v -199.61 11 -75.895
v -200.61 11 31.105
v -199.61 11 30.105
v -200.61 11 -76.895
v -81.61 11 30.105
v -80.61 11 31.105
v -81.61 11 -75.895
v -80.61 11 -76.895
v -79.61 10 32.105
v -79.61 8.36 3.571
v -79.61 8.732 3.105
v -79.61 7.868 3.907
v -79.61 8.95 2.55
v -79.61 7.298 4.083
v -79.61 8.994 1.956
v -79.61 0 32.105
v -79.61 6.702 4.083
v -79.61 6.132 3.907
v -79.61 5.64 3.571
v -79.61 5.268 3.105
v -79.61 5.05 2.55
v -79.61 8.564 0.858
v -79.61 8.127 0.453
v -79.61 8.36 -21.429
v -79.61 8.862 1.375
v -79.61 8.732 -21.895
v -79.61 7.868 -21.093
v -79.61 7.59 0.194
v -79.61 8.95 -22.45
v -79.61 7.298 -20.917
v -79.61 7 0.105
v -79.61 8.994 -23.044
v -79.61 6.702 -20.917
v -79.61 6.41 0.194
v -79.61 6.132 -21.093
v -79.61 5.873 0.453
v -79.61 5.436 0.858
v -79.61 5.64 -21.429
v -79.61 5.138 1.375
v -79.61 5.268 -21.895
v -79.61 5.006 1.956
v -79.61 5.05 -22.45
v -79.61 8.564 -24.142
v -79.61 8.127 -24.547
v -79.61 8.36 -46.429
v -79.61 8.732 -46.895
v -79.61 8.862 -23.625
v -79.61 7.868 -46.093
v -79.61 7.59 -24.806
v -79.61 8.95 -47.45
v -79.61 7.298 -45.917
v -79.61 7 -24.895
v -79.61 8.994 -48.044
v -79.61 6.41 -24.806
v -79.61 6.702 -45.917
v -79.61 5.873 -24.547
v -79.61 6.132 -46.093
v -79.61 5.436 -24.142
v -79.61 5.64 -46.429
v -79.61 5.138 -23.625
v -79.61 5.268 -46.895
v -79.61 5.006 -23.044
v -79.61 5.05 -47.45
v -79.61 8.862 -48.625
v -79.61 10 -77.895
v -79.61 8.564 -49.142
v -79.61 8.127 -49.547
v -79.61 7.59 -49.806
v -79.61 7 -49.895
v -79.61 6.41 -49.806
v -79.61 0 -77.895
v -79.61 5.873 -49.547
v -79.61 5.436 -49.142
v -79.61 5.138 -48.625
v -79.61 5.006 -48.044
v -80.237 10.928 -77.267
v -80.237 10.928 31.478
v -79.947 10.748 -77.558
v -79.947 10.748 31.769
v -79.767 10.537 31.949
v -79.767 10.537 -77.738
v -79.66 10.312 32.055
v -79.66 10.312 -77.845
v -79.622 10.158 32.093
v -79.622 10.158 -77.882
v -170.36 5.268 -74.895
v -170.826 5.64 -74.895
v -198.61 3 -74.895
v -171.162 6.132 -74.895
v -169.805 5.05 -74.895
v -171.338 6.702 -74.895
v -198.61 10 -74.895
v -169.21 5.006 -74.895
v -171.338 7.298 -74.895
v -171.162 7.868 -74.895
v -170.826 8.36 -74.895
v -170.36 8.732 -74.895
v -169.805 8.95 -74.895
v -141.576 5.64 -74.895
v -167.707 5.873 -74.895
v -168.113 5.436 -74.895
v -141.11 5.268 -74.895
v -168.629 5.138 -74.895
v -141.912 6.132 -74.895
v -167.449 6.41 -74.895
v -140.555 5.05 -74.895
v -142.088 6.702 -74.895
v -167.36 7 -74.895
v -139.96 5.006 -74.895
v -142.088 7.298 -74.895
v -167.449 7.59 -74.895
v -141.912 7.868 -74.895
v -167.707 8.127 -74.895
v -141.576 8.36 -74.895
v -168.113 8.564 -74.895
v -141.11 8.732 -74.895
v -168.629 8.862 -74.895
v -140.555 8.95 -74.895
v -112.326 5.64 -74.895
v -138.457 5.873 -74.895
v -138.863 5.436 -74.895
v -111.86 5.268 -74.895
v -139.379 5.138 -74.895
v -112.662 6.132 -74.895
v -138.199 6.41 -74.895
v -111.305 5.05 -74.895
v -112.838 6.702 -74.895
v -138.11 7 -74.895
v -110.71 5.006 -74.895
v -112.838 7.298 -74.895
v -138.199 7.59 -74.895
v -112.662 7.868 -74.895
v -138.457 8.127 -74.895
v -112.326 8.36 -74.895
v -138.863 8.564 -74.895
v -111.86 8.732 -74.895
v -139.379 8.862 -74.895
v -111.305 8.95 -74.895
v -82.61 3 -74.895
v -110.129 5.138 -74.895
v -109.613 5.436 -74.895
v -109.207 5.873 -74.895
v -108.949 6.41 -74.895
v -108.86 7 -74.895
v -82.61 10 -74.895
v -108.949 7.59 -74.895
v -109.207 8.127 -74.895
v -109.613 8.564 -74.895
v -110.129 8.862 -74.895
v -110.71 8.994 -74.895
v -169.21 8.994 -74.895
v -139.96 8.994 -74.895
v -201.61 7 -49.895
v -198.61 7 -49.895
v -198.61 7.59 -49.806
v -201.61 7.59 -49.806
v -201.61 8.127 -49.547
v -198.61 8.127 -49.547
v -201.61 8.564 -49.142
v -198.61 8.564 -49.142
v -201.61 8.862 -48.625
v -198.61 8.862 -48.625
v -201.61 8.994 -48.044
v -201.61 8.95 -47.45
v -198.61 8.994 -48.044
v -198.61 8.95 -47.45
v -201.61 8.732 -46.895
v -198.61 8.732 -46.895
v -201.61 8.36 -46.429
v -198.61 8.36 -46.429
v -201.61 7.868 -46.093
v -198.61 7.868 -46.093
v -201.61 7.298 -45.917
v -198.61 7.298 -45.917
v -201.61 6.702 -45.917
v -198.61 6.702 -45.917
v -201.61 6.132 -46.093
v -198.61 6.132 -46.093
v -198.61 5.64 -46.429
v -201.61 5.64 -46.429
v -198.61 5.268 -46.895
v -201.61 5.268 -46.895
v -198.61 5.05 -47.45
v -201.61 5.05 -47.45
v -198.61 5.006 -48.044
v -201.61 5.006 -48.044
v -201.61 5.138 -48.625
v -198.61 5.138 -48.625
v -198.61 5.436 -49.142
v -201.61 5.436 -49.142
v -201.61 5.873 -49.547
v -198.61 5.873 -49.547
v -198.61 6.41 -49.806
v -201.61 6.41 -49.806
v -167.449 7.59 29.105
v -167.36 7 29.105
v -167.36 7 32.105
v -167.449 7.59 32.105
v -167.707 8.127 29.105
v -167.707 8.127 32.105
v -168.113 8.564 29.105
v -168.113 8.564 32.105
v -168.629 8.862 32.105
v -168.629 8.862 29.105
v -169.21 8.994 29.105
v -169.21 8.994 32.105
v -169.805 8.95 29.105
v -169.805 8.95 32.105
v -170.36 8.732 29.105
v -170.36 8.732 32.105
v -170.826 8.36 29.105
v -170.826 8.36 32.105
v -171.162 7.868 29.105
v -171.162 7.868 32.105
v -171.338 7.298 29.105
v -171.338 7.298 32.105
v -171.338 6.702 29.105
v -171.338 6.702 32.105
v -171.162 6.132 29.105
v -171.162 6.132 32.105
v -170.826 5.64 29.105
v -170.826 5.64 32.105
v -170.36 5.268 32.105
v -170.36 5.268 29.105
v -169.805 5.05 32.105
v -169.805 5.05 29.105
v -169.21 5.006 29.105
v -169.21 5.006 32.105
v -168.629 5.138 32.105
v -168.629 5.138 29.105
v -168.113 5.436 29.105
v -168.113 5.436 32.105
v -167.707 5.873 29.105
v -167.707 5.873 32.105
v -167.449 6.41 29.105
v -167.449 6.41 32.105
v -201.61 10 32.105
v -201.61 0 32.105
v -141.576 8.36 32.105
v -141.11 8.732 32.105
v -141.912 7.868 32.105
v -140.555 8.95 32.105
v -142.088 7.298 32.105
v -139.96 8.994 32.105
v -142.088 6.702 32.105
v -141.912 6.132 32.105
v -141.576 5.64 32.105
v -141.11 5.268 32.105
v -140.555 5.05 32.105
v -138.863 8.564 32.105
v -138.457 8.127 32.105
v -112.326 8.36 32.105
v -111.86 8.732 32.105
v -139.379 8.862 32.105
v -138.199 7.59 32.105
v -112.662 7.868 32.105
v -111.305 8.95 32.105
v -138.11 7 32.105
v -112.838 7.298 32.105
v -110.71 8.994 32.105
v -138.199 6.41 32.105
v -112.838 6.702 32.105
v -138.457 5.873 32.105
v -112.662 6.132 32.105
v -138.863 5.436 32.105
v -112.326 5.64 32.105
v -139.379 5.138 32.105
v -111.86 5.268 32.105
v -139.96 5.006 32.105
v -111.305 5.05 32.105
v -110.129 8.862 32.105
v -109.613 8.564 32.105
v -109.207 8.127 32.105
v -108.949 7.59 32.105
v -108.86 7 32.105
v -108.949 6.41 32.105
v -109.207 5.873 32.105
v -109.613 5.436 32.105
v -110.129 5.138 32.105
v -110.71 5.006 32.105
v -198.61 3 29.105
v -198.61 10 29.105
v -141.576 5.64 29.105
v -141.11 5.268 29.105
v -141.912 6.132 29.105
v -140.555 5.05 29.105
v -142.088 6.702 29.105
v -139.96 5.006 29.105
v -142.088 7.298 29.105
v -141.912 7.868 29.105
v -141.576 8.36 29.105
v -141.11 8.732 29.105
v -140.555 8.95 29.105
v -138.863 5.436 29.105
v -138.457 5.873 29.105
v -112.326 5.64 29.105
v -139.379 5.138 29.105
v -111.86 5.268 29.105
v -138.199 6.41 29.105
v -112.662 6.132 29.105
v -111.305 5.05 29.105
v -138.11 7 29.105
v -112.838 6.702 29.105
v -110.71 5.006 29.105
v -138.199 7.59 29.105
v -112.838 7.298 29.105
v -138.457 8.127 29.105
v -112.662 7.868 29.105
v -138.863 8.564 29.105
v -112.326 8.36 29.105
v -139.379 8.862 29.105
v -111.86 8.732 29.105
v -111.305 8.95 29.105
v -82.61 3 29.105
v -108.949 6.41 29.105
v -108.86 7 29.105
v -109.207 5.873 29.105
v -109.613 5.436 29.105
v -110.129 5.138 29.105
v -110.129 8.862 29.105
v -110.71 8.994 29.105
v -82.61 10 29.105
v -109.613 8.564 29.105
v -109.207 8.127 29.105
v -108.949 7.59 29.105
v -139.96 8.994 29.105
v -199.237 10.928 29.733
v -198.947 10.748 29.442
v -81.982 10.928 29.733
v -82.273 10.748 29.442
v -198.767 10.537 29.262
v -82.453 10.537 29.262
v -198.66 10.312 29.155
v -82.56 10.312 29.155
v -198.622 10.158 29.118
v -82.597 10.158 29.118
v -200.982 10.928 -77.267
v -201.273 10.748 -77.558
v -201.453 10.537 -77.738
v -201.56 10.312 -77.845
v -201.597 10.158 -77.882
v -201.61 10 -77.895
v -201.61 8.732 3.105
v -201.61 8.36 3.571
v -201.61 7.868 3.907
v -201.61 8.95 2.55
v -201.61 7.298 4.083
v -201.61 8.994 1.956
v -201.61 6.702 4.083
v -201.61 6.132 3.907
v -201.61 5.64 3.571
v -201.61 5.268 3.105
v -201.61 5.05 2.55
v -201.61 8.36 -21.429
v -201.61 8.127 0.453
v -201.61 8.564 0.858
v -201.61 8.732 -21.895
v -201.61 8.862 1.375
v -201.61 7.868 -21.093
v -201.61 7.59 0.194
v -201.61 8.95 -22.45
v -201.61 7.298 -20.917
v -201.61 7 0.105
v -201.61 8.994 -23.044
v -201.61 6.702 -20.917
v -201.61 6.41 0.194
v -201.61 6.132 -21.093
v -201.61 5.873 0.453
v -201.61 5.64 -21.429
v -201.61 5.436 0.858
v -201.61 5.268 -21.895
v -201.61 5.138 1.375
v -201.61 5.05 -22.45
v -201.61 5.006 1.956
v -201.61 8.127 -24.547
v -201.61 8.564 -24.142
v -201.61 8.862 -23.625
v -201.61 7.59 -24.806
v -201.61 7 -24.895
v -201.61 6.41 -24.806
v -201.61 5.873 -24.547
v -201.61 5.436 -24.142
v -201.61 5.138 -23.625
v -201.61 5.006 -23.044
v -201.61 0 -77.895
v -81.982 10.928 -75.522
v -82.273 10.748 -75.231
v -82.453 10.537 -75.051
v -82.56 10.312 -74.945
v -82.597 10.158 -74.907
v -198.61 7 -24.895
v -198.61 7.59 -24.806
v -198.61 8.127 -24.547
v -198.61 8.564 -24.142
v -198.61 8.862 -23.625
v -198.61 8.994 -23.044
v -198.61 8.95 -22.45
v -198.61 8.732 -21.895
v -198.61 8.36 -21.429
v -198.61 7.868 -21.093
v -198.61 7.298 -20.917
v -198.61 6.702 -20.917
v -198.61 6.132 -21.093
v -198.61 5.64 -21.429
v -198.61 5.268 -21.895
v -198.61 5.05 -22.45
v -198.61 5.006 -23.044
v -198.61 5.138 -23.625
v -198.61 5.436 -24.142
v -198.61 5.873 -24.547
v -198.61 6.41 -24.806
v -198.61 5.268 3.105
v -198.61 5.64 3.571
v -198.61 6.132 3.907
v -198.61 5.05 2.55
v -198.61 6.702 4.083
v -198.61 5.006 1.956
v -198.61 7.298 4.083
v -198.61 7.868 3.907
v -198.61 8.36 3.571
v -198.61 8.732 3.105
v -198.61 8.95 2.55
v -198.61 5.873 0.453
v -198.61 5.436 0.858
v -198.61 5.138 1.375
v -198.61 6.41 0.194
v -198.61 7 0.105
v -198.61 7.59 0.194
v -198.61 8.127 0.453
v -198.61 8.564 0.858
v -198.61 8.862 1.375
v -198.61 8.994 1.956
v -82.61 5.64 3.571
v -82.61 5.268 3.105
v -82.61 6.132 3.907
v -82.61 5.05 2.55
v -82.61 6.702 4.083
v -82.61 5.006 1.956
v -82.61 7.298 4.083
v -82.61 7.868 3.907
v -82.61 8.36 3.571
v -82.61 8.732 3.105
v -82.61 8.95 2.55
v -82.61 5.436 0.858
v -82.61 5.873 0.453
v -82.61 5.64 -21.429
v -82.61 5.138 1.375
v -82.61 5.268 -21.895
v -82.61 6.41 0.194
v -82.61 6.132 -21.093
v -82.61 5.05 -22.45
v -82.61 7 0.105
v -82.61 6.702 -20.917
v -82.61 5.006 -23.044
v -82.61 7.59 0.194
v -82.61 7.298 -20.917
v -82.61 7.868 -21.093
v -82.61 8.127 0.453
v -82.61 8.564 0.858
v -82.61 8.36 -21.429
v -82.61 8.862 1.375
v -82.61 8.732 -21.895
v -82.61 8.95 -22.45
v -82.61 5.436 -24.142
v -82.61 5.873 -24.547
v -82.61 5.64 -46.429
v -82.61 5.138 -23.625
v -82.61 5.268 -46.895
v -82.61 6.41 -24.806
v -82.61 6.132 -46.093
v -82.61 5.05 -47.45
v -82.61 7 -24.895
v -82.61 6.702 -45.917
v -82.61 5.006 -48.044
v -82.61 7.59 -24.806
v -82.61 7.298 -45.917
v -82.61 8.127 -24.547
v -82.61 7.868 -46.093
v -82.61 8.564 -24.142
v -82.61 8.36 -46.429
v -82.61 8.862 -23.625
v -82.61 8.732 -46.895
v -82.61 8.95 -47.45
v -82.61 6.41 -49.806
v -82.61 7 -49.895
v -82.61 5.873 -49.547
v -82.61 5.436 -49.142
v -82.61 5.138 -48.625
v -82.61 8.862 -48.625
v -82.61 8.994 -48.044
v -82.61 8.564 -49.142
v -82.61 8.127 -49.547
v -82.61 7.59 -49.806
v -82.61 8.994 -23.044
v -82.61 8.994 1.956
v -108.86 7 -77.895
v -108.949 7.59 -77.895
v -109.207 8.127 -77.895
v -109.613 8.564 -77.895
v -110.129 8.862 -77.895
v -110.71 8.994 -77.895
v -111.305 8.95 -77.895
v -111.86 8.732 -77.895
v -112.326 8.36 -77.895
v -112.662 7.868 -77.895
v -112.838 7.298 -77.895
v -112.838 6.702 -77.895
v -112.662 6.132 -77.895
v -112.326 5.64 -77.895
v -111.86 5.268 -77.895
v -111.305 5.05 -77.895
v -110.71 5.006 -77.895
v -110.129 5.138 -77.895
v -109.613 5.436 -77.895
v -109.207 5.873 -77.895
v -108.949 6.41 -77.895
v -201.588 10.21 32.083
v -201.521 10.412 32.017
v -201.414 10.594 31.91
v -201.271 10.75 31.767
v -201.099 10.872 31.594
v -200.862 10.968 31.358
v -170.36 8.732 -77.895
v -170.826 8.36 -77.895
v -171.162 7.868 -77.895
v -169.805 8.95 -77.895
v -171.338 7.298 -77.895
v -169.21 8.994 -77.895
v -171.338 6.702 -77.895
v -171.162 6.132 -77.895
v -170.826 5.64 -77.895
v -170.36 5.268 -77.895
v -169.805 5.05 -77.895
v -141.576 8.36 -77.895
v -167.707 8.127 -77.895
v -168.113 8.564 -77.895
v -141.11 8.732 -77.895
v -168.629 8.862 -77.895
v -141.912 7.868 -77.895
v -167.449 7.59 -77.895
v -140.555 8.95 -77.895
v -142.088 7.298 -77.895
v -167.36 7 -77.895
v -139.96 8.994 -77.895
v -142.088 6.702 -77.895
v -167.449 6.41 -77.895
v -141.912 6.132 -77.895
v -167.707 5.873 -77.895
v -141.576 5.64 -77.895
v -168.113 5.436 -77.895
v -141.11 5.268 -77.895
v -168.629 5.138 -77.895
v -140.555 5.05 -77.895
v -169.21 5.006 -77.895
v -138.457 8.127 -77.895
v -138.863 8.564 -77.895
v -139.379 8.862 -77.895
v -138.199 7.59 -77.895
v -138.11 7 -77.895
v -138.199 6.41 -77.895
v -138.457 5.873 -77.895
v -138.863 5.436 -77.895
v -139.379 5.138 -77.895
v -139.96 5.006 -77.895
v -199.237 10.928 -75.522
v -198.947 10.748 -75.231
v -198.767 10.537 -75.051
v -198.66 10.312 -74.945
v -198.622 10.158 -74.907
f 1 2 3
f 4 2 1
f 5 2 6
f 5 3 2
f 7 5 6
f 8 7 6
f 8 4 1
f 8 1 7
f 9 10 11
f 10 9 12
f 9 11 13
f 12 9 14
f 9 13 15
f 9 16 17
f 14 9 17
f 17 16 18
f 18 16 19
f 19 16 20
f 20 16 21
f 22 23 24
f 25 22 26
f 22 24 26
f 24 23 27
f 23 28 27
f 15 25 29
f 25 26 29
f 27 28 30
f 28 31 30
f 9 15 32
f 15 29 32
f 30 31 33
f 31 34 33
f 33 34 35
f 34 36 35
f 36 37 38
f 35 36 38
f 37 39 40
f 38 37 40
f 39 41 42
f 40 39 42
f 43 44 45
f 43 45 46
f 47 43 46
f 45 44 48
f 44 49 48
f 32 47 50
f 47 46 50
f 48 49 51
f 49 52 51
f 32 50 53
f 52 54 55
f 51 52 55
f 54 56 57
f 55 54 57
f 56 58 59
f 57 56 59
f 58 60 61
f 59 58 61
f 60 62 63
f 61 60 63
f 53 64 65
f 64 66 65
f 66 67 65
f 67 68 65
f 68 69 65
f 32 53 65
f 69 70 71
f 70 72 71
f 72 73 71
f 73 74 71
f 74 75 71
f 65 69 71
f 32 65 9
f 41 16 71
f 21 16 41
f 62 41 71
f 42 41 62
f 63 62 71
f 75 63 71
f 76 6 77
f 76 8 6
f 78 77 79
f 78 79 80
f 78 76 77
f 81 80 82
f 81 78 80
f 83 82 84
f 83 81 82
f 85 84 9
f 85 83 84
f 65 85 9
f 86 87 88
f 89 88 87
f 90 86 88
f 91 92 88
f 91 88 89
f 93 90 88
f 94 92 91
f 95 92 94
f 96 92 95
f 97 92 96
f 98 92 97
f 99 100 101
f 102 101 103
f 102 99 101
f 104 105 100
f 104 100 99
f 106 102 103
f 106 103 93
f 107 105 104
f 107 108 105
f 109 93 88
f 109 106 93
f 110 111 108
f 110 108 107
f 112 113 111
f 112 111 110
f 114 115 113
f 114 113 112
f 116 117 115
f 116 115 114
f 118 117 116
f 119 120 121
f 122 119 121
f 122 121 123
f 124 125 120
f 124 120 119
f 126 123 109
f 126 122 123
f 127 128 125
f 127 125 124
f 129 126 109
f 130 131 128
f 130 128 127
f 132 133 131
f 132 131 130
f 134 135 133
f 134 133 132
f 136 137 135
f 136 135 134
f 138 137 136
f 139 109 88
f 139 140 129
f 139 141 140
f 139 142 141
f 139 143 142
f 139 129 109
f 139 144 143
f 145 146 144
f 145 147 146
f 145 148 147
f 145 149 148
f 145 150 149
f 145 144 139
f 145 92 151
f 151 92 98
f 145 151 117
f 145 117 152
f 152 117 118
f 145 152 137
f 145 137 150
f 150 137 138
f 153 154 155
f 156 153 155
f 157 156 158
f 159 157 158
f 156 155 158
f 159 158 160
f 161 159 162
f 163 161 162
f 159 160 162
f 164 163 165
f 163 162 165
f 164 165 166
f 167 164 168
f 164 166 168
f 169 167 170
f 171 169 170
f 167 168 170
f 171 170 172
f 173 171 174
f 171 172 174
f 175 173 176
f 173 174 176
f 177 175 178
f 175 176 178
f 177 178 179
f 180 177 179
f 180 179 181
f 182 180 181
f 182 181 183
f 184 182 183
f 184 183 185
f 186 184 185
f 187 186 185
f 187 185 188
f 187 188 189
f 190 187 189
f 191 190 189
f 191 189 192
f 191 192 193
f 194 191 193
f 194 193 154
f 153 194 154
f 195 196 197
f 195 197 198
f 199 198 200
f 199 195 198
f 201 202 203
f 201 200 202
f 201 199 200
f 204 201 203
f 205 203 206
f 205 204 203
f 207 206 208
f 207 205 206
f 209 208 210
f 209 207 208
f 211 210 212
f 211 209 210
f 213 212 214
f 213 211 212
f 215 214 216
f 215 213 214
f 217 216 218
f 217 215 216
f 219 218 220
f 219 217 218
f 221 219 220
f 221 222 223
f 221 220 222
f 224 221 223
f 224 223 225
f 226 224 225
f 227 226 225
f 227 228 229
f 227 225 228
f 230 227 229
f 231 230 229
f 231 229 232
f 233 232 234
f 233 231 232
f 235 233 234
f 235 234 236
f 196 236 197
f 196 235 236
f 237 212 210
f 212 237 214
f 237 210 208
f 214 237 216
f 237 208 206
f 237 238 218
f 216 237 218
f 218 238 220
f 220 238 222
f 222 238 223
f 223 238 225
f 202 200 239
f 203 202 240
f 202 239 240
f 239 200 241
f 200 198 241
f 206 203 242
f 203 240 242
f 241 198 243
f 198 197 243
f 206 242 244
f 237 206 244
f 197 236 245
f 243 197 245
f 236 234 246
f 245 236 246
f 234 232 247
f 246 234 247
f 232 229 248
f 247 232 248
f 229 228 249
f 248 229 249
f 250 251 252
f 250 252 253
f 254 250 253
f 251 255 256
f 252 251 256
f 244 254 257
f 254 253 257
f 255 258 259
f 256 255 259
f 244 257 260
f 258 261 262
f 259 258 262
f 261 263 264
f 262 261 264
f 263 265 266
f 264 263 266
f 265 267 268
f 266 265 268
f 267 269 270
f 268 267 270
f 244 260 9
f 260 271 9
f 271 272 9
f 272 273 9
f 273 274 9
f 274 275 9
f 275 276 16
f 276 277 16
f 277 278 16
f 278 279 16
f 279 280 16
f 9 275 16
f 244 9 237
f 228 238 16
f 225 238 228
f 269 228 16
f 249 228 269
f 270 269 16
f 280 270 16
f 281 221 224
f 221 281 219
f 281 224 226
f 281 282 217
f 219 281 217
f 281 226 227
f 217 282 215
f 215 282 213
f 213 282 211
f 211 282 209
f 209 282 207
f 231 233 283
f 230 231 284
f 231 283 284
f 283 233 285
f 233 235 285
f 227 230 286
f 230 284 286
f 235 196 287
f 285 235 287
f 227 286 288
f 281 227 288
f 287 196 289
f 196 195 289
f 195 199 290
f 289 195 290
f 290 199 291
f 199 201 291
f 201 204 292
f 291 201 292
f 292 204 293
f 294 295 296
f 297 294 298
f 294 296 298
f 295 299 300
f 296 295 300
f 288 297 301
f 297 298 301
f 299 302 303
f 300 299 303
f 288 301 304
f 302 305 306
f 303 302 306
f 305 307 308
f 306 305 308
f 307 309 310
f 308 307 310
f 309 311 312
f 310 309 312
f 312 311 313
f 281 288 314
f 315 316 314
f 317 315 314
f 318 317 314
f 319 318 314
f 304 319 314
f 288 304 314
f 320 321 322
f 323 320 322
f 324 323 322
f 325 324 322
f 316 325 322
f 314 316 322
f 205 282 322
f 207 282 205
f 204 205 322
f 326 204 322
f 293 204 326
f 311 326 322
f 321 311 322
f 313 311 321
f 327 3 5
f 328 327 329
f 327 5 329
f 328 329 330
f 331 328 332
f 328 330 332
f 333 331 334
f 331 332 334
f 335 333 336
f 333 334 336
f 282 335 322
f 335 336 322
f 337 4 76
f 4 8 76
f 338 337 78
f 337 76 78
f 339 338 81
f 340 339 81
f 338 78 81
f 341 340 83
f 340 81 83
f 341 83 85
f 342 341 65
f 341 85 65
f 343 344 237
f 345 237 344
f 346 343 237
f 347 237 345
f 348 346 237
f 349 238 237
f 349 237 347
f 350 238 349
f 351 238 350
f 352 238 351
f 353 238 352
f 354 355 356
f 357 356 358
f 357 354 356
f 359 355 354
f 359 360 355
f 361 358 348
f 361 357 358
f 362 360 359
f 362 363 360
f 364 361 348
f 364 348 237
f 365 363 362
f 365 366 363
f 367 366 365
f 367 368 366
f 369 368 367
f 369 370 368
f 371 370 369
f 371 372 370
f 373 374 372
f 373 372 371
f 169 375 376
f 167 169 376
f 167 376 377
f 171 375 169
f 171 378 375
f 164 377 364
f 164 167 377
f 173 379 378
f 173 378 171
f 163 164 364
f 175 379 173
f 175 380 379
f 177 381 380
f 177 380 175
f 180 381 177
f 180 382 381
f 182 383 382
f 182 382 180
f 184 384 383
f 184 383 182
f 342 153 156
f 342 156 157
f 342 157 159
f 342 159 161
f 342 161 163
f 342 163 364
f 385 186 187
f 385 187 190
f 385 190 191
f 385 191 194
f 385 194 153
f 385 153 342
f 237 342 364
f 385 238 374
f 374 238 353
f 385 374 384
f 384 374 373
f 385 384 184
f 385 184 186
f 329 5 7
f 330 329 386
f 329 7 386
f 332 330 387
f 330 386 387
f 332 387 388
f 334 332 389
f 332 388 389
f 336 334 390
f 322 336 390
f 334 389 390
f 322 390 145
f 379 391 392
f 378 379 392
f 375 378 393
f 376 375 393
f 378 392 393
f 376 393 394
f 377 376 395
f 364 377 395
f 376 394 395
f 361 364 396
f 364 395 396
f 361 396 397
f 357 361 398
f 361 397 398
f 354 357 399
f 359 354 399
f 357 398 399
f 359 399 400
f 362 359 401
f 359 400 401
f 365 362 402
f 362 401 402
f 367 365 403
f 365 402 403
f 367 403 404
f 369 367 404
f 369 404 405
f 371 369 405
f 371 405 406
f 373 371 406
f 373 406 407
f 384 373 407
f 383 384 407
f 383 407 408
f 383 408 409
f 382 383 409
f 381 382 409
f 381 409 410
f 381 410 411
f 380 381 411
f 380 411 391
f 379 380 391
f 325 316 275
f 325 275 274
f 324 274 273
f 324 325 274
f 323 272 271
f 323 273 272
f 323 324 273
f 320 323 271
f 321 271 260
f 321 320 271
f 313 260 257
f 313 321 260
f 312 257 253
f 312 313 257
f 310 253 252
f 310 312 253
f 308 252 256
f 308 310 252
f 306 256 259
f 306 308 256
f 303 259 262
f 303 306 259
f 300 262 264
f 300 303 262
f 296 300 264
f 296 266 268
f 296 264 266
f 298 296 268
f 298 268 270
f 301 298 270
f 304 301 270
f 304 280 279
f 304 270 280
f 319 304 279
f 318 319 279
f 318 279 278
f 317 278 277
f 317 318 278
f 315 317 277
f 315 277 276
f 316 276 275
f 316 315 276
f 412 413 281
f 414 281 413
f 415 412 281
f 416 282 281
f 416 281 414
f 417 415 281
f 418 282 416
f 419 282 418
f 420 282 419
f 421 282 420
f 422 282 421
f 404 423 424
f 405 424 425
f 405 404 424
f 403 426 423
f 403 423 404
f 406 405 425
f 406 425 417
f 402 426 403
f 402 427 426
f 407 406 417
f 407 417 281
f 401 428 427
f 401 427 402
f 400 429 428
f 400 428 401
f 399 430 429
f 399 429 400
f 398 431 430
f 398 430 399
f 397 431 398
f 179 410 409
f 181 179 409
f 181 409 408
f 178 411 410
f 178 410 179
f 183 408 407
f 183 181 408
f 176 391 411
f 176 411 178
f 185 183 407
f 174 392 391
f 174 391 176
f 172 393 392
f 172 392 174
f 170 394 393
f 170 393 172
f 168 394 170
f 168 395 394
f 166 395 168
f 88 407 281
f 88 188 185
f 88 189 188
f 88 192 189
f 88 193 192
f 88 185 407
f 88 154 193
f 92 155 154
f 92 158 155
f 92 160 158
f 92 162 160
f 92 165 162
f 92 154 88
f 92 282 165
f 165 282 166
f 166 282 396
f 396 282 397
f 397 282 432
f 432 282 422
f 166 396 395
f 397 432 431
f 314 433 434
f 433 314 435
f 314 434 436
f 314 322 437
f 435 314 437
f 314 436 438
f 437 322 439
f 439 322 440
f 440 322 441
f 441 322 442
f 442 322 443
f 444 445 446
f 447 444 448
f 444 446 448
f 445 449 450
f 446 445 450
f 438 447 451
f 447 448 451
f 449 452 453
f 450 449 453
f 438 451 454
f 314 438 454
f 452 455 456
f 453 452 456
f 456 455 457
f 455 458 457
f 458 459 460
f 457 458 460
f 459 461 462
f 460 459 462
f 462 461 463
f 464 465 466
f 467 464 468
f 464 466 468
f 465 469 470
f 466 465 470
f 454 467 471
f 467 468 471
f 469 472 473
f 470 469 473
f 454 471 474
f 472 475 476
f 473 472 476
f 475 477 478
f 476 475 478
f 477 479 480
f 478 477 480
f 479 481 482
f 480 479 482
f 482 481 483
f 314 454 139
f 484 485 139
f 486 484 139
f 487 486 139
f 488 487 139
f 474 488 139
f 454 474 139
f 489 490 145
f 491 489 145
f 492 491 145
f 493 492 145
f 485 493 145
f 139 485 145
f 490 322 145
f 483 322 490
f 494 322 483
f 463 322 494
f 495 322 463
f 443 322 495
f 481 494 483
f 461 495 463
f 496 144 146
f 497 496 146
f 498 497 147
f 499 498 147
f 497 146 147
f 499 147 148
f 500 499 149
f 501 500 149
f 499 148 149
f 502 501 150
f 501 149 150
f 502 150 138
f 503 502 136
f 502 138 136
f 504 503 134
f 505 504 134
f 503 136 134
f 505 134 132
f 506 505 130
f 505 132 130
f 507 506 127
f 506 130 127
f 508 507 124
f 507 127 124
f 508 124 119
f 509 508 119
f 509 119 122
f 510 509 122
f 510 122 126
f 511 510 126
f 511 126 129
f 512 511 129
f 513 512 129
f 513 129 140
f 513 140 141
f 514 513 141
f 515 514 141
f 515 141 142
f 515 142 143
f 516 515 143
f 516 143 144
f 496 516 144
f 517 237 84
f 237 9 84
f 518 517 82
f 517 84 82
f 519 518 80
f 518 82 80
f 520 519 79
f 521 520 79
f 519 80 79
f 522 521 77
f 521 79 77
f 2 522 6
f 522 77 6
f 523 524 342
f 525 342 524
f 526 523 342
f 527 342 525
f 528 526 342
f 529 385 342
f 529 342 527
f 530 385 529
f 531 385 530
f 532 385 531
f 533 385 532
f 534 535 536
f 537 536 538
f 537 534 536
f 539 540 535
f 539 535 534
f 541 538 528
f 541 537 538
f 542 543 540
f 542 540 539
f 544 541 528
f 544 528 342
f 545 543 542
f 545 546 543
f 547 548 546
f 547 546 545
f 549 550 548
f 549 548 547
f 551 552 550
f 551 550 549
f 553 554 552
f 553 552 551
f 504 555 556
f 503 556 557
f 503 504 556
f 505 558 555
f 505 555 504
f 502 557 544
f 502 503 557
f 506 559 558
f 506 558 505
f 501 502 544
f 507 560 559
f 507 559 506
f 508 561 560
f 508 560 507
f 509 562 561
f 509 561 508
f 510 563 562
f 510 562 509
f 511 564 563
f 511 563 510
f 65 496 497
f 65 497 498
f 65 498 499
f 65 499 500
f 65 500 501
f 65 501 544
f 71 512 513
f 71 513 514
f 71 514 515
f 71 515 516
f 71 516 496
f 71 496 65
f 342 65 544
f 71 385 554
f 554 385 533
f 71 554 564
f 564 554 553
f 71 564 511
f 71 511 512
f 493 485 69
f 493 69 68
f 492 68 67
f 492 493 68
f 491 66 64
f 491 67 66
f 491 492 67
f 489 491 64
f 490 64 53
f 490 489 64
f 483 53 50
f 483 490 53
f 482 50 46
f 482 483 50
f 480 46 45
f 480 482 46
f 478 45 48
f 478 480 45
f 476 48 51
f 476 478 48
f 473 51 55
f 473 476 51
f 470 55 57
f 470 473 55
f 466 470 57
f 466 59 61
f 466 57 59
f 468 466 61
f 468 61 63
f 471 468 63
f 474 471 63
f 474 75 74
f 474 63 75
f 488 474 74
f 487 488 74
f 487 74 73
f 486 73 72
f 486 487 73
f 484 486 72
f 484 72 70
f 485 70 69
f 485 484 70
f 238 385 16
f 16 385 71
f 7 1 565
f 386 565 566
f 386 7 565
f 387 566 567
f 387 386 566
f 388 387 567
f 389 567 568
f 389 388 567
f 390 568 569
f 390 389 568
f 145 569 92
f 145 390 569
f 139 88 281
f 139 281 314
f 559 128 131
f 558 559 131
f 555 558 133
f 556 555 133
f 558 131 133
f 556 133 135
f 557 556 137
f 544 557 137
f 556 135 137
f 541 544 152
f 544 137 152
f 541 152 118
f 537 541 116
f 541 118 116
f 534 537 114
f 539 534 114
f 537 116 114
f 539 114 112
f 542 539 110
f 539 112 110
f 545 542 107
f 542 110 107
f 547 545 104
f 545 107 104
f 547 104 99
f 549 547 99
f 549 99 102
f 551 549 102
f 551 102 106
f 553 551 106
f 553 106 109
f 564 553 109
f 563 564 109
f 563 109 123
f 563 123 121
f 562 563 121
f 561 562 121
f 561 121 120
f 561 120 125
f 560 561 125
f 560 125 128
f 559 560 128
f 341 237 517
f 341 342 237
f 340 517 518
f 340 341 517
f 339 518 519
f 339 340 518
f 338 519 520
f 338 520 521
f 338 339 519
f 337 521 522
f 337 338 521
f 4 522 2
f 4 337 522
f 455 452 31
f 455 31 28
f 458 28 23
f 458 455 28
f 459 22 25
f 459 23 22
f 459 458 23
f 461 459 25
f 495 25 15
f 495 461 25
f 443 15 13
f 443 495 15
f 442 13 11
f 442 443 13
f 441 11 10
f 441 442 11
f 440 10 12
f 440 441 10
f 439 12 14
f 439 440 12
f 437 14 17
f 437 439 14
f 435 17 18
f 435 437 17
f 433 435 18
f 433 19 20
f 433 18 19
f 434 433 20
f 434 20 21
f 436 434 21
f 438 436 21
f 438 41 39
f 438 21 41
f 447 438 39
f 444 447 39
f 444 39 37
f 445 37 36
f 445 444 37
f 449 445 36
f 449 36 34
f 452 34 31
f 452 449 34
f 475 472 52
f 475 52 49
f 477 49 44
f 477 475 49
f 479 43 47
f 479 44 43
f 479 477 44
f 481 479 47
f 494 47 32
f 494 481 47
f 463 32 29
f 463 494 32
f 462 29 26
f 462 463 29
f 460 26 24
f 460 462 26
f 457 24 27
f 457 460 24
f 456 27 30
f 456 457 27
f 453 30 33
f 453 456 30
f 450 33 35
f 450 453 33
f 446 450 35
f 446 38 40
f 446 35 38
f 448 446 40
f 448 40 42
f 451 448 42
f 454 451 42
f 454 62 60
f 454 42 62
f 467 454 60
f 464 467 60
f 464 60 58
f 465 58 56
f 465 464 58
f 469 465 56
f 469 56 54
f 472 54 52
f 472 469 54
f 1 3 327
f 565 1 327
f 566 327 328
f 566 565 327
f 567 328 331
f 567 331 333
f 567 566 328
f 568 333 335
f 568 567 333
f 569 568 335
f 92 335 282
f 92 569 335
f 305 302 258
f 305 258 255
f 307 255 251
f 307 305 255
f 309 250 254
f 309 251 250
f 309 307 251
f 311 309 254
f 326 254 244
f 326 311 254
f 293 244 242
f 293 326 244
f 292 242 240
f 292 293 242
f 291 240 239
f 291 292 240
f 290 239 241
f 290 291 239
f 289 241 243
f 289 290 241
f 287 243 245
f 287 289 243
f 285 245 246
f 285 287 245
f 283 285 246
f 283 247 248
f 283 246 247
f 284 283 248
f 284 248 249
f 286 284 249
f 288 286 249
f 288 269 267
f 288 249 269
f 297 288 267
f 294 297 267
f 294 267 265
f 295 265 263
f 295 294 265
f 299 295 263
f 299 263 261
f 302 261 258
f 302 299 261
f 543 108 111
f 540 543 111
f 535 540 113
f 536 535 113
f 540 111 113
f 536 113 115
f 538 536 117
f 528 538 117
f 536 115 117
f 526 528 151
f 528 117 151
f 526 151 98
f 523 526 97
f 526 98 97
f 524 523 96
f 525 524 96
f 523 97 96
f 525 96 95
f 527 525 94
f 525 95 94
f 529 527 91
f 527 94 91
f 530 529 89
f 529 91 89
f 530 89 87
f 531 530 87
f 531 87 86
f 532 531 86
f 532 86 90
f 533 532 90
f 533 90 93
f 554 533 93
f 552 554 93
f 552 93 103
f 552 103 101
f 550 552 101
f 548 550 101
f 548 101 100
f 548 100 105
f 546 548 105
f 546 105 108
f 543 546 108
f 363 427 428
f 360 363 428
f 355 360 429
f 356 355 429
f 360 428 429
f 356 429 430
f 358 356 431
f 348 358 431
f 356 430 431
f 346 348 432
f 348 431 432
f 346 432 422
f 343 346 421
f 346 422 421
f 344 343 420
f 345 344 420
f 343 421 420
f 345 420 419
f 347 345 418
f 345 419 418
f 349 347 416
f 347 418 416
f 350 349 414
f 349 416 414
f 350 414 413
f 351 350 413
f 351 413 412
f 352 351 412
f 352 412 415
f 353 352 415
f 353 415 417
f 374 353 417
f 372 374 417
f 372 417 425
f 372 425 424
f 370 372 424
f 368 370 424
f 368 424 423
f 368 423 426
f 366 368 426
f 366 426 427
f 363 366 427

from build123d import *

# Parameters (mm, degrees)
SKETCH1_W               = 122
SKETCH1_H               = 110
BOSS_EXTRUDE1_DEPTH     = 11
SKETCH4_W               = 116
SKETCH4_H               = 104
CUT_EXTRUDE1_DEPTH      = 8
SKETCH6_R               = 1.999999993
SKETCH6_R_2             = 2
CUT_EXTRUDE6_DEPTH      = 120
CUT_EXTRUDE6_DEPTH_BACK = 4
SKETCH5_R               = 2
CUT_EXTRUDE5_DEPTH      = 108
CUT_EXTRUDE5_DEPTH_BACK = 4
FILLET2_R               = 1


with BuildPart() as part:
    # Sketch1 → Boss-Extrude1 (new body)
    with BuildSketch(Plane(origin=(0, 0, 0), x_dir=(1, 0, 0), z_dir=(0, 1, 0))):
        with Locations((-140.609907121, 22.894736842)):
            Rectangle(SKETCH1_W, SKETCH1_H)
    extrude(amount=BOSS_EXTRUDE1_DEPTH)

    # Sketch4 → Cut-Extrude1 (cut)
    with BuildSketch(Plane(origin=(0, 11, 0), x_dir=(1, 0, 0), z_dir=(0, 1, 0))):
        with Locations((-140.609907121, 22.894736842)):
            Rectangle(SKETCH4_W, SKETCH4_H)
    extrude(amount=-CUT_EXTRUDE1_DEPTH, mode=Mode.SUBTRACT)

    # Sketch6 → Cut-Extrude6 (cut, two sides)
    with BuildSketch(Plane(origin=(-198.609907121, 0, 0), x_dir=(0, 0, -1), z_dir=(1, 0, 0))) as cut_extrude6_sk:
        with Locations((-2.105263158, 6.999999977)):
            Circle(SKETCH6_R)
        with Locations((22.894736842, 6.999999977)):
            Circle(SKETCH6_R)
        with Locations((47.894736842, 7)):
            Circle(SKETCH6_R_2)
    extrude(amount=CUT_EXTRUDE6_DEPTH, mode=Mode.SUBTRACT)
    extrude(cut_extrude6_sk.sketch, amount=-CUT_EXTRUDE6_DEPTH_BACK, mode=Mode.SUBTRACT)

    # Sketch5 → Cut-Extrude5 (cut, two sides)
    with BuildSketch(Plane.XY.offset(-74.894736842)) as cut_extrude5_sk:
        with Locations((-169.359907121, 7)):
            Circle(SKETCH5_R)
        with Locations((-140.109907121, 7)):
            Circle(SKETCH5_R)
        with Locations((-110.859907121, 7)):
            Circle(SKETCH5_R)
    extrude(amount=CUT_EXTRUDE5_DEPTH, mode=Mode.SUBTRACT)
    extrude(cut_extrude5_sk.sketch, amount=-CUT_EXTRUDE5_DEPTH_BACK, mode=Mode.SUBTRACT)

    # Fillet2
    fillet2_edges = [part.edges().sort_by_distance(p)[0] for p in [
        (-79.609907121, 11, -22.894736842),
        (-140.609907121, 11, -77.894736842),
        (-198.609907121, 11, -22.894736842),
        (-140.609907121, 11, 29.105263158),
        (-82.609907121, 11, -22.894736842),
        (-140.609907121, 11, -74.894736842),
        (-201.609907121, 11, -22.894736842),
        (-140.609907121, 11, 32.105263158),
    ]]
    fillet(fillet2_edges, radius=FILLET2_R)


solid = part.part
